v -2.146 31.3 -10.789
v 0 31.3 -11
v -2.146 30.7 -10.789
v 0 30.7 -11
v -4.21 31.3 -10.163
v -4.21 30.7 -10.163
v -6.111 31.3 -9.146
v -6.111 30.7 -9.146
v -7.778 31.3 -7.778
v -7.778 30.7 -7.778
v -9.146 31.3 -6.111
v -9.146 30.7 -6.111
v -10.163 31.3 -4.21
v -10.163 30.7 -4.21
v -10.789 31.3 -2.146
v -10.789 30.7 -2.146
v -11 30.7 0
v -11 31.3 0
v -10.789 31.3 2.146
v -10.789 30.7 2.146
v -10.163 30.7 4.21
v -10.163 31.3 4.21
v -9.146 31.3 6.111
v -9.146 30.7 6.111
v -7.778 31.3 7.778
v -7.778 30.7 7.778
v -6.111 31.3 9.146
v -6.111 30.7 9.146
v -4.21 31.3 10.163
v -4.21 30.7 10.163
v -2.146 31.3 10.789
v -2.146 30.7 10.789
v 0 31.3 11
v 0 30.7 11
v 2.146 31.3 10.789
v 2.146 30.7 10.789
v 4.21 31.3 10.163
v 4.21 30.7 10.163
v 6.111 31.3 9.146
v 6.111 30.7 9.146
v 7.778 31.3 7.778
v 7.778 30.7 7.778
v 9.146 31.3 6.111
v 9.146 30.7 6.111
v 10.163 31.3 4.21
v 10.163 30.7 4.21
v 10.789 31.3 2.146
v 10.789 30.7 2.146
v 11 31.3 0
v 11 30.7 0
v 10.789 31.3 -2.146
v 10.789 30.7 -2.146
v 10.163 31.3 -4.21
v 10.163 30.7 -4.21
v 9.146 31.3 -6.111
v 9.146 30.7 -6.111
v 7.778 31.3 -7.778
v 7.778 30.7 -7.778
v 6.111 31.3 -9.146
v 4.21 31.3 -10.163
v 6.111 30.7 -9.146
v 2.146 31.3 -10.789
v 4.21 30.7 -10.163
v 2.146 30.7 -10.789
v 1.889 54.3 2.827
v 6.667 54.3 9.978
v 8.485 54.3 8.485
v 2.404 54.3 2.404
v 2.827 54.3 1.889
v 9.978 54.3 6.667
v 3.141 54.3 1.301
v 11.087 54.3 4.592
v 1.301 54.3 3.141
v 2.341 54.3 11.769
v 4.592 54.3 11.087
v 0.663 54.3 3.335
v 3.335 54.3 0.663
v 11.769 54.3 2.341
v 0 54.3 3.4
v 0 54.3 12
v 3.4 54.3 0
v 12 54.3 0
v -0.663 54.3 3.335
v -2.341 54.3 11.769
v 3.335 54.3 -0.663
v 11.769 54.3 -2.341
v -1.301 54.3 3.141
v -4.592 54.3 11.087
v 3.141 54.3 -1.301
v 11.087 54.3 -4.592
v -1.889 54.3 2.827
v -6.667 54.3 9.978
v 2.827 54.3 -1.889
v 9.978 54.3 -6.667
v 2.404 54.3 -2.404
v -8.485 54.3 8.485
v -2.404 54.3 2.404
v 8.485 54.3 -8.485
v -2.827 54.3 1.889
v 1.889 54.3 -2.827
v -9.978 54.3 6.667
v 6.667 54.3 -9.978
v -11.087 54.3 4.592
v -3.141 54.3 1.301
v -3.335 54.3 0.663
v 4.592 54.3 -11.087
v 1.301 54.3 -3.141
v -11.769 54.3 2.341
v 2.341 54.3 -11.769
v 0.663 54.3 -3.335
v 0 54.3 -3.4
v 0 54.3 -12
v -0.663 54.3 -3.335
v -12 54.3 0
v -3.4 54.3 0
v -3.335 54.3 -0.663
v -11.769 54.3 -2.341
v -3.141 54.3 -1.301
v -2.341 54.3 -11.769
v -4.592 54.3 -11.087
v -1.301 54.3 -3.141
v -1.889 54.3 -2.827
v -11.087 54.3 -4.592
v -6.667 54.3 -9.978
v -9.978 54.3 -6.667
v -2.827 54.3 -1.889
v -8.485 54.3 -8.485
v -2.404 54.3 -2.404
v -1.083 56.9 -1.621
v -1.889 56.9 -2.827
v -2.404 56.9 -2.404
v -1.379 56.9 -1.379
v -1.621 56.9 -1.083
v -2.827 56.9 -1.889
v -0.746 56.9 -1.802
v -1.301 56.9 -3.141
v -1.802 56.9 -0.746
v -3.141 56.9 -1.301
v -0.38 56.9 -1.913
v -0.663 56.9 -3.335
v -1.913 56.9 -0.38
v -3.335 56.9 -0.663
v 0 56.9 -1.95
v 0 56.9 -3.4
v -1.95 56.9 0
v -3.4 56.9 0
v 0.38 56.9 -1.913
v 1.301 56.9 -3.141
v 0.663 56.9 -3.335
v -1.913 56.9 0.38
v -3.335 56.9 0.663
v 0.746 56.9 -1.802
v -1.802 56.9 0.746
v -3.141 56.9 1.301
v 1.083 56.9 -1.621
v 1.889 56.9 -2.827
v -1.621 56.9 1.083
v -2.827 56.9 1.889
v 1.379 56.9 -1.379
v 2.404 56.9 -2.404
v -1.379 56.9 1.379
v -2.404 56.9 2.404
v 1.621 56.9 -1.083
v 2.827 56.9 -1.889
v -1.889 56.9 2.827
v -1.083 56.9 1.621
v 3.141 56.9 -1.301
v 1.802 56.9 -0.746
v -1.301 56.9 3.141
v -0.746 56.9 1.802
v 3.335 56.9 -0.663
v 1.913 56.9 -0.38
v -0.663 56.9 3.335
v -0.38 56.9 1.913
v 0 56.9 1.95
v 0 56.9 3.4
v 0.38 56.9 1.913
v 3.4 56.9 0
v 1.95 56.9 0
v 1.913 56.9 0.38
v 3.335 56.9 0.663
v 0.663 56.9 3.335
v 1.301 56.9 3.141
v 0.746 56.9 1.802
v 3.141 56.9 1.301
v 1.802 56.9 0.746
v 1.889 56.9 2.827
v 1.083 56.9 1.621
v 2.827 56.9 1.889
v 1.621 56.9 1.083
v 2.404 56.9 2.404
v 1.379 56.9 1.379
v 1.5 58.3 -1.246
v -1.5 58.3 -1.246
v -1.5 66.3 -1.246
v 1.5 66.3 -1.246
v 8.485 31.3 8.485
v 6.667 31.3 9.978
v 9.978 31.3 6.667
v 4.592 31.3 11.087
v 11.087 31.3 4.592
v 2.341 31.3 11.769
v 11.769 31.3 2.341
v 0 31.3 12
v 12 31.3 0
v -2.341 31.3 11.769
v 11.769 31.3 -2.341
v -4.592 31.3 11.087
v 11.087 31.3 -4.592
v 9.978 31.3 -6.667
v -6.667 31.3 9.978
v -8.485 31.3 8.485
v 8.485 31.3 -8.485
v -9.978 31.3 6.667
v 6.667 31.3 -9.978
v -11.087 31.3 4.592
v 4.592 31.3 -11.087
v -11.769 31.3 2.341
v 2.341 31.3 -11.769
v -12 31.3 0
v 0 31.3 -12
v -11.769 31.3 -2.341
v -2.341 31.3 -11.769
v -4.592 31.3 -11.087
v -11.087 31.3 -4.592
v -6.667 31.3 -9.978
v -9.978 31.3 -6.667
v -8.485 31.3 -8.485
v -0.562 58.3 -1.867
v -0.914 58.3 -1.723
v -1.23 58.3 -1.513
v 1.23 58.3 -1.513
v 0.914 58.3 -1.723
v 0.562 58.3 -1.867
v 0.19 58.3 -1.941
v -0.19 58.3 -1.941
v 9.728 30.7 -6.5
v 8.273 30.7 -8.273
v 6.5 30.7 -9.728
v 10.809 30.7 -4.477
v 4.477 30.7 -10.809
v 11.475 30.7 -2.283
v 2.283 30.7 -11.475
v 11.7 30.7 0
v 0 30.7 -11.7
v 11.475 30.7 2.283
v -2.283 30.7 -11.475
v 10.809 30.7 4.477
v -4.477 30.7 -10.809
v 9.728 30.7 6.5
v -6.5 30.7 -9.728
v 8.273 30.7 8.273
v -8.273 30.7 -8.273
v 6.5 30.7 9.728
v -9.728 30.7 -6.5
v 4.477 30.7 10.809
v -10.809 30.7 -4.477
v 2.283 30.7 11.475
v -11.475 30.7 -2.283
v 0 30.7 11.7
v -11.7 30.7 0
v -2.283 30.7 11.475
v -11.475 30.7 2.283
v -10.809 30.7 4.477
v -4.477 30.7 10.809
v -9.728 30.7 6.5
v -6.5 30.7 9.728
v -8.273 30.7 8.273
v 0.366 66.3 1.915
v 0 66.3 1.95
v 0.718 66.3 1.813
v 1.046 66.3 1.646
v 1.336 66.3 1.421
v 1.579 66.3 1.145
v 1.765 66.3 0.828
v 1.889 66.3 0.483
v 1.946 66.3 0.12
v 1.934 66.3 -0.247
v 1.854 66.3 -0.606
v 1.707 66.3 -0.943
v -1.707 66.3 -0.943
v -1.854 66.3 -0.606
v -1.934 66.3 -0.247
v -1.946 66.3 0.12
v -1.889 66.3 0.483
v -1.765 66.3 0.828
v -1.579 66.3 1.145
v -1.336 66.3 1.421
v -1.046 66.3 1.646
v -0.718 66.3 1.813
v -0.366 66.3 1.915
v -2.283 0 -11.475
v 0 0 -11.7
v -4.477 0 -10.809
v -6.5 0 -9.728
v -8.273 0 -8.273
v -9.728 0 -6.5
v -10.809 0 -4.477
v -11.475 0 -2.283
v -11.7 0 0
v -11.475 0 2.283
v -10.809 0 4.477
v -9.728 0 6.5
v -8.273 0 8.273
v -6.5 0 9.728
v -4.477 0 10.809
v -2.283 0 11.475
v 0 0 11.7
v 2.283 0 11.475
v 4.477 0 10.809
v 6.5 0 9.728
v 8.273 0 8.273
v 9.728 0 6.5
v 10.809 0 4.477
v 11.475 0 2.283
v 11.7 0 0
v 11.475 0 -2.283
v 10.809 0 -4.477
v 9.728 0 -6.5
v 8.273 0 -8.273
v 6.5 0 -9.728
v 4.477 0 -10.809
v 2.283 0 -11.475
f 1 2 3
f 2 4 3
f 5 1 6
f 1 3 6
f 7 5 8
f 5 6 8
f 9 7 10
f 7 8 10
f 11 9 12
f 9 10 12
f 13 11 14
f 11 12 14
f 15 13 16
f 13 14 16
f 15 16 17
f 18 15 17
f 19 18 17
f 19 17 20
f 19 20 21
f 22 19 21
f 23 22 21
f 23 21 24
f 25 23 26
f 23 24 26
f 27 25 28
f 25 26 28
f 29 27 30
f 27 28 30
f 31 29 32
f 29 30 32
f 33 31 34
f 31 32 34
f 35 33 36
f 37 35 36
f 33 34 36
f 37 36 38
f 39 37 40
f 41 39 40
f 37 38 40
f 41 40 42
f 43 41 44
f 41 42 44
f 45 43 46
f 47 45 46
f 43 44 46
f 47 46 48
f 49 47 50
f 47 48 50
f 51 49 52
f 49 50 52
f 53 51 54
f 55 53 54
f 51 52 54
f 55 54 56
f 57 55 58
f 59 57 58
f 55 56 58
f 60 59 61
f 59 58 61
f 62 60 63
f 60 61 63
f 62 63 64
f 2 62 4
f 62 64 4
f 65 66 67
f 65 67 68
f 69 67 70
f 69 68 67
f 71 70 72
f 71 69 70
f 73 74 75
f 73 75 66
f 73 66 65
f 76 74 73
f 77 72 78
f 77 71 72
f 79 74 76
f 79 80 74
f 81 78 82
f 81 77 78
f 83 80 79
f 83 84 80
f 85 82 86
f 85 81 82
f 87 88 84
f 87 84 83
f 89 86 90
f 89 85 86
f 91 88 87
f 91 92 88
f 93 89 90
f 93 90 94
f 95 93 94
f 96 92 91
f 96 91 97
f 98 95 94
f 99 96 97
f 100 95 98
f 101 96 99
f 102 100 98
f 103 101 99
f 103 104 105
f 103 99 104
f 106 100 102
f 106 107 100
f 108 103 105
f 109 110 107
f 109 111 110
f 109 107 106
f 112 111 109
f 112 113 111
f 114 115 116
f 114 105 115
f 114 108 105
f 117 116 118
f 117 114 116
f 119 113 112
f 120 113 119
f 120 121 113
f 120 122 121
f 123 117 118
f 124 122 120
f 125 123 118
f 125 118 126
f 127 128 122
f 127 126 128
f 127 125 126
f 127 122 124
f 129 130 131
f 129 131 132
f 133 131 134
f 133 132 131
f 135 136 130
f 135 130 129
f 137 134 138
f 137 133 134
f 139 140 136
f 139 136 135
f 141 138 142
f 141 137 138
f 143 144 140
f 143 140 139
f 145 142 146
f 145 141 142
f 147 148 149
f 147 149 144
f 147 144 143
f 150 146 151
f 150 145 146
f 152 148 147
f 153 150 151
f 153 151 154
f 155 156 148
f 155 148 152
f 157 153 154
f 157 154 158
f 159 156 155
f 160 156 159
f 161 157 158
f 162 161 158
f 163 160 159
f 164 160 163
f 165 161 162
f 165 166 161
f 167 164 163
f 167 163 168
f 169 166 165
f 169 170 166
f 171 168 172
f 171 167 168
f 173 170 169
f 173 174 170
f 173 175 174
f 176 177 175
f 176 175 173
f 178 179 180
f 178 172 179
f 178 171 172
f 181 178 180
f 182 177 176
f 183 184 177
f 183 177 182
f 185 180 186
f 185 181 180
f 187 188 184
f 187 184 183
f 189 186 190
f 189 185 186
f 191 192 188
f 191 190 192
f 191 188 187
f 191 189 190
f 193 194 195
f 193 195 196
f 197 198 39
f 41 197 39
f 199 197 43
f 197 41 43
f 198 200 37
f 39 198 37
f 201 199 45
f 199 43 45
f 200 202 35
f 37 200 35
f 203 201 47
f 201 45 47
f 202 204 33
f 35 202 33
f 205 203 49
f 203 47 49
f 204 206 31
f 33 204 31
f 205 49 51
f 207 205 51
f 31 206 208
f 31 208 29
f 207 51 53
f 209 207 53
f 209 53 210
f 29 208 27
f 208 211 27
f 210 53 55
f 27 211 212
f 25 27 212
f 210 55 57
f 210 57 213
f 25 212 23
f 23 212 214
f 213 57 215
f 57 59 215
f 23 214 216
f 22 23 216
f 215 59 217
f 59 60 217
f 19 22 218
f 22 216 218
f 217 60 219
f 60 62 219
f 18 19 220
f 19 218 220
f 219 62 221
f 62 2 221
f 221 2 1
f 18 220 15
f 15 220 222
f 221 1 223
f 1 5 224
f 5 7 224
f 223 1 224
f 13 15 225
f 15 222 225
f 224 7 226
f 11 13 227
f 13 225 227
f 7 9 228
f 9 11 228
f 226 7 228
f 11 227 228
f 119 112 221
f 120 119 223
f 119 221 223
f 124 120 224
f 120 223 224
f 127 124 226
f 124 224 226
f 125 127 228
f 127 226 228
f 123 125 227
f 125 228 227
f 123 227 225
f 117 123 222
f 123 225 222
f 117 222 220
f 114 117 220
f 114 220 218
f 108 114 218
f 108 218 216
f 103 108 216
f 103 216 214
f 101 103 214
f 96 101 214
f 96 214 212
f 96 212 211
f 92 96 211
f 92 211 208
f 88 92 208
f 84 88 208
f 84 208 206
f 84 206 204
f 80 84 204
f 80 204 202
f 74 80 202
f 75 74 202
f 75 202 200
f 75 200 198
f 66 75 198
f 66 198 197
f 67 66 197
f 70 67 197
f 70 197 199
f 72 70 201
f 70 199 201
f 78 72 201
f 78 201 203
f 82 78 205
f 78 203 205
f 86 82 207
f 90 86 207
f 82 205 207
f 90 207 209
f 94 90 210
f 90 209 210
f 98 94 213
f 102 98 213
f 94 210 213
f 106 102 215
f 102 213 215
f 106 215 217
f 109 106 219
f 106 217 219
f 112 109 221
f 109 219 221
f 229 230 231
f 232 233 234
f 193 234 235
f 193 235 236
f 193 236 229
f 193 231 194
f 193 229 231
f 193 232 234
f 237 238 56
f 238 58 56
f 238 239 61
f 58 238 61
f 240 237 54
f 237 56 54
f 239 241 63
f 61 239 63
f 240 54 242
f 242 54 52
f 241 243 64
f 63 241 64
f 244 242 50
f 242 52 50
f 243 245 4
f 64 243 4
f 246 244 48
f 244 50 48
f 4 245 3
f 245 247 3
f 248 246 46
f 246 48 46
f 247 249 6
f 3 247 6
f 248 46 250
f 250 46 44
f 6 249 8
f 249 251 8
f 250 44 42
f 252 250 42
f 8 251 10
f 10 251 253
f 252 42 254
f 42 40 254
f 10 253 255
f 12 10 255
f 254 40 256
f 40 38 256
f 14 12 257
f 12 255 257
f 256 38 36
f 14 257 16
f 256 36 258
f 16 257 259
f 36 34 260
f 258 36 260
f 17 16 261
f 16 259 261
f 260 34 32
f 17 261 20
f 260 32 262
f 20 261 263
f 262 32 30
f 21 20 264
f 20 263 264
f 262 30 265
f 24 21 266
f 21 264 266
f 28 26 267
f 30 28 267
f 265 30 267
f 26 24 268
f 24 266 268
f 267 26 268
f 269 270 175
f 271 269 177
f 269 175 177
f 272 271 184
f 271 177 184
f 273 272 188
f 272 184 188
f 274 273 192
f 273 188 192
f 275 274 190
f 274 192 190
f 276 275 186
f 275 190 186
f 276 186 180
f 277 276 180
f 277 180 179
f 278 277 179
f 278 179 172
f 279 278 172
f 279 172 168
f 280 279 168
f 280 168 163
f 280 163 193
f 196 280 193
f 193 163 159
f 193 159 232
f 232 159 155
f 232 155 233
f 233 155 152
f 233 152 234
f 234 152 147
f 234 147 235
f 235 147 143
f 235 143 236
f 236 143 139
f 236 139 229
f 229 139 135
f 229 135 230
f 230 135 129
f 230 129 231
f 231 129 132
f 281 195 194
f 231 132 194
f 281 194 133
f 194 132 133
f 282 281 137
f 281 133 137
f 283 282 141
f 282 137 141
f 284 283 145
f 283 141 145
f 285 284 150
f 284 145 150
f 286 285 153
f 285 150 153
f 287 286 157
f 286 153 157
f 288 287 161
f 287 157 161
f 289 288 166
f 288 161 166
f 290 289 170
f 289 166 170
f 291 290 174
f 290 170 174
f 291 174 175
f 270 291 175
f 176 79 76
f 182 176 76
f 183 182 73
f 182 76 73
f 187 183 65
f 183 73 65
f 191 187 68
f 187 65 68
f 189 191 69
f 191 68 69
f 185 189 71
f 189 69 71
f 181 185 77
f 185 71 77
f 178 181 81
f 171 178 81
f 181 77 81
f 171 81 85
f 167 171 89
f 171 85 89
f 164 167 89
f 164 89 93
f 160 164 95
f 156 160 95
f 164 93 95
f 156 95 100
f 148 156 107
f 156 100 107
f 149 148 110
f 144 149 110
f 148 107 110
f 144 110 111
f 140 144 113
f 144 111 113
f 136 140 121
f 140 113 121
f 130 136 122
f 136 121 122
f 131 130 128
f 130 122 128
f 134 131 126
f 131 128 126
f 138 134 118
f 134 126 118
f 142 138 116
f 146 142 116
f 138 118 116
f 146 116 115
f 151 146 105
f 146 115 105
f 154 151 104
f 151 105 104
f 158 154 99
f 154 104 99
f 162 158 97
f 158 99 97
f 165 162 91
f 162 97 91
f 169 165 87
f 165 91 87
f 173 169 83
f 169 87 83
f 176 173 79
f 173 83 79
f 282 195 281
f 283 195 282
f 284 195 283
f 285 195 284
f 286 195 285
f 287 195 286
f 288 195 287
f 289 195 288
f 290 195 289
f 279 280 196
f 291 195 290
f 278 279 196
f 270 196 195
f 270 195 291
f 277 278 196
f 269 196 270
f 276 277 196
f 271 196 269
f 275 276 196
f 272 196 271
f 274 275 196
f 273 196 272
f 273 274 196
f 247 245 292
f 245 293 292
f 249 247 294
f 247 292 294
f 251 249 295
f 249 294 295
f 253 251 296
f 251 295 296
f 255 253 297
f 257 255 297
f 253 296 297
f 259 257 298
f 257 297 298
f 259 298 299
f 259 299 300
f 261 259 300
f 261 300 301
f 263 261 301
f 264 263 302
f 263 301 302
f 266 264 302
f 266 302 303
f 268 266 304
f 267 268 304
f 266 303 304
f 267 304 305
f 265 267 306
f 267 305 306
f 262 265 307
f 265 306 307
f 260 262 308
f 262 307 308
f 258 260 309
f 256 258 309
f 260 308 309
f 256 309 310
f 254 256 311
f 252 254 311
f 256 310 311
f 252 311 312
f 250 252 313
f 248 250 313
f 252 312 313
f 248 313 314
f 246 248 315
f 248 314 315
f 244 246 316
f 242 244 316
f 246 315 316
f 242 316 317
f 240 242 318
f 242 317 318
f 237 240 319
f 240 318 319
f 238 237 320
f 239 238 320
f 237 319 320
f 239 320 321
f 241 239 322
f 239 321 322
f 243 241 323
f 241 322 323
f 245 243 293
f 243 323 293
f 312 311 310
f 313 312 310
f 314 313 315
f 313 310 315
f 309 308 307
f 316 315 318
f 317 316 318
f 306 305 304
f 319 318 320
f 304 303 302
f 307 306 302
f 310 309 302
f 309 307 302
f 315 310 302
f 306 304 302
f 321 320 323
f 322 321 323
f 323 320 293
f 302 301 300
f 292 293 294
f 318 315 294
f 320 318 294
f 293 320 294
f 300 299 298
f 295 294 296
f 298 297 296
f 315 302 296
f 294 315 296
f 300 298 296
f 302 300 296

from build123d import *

# Parameters (mm, degrees)
SKETCH_1_R          = 12
EXTRUDE_1_DEPTH     = 54.3
SKETCH_2_R          = 3.4
SKETCH_2_R_2        = 1.95
EXTRUDE_2_DEPTH     = 2.6
SKETCH_3_R          = 1.95
EXTRUDE_3_DEPTH     = 12
CUT_EXTRUDE_START   = -8
CUT_EXTRUDE_1_DEPTH = 8


with BuildPart() as part:
    # 草图1 → 凸台-拉伸1 (new body)
    with BuildSketch(Plane(origin=(0, 0, 0), x_dir=(1, 0, 0), z_dir=(0, 1, 0))):
        with Locations(Location((0, 0, 0), (0, 0, 90))):
            Circle(SKETCH_1_R)
    extrude(amount=EXTRUDE_1_DEPTH)

    # 草图2 → 凸台-拉伸2 (add)
    with BuildSketch(Plane(origin=(0, 54.3, 0), x_dir=(1, 0, 0), z_dir=(0, 1, 0))):
        with Locations(Location((0, 0, 0), (0, 0, 270))):
            Circle(SKETCH_2_R)
        with Locations(Location((0, 0, 0), (0, 0, 270))):
            Circle(SKETCH_2_R_2, mode=Mode.SUBTRACT)
    extrude(amount=EXTRUDE_2_DEPTH)

    # 草图3 → 凸台-拉伸3 (add)
    with BuildSketch(Plane(origin=(0, 54.3, 0), x_dir=(1, 0, 0), z_dir=(0, 1, 0))):
        with Locations(Location((0, 0, 0), (0, 0, 270))):
            Circle(SKETCH_3_R)
    extrude(amount=EXTRUDE_3_DEPTH)

    # 草图4 → 切除-拉伸1 (cut)
    with BuildSketch(Plane(origin=(0, 66.3, 0), x_dir=(1, 0, 0), z_dir=(0, 1, 0)).offset(CUT_EXTRUDE_START)):
        with BuildLine():
            Line((-1.5, 1.245993579), (1.5, 1.245993579))
            ThreePointArc((1.5, 1.245993579), (0, 1.95), (-1.5, 1.245993579))
        make_face()
    extrude(amount=CUT_EXTRUDE_1_DEPTH, mode=Mode.SUBTRACT)

    # 草图5 → 切除-旋转1 (revolve, cut)
    with BuildSketch(Plane(origin=(0, 0, 0), x_dir=(0, 0, -1), z_dir=(1, 0, 0))):
        Polygon((12, 31.3), (11, 31.3), (11, 30.7), (11.7, 30.7), (11.7, 0), (12, 0), (12, 30.7), align=None)
    revolve(axis=Axis((0, -3.315, 0), (0, 1, 0)), mode=Mode.SUBTRACT)


solid = part.part
